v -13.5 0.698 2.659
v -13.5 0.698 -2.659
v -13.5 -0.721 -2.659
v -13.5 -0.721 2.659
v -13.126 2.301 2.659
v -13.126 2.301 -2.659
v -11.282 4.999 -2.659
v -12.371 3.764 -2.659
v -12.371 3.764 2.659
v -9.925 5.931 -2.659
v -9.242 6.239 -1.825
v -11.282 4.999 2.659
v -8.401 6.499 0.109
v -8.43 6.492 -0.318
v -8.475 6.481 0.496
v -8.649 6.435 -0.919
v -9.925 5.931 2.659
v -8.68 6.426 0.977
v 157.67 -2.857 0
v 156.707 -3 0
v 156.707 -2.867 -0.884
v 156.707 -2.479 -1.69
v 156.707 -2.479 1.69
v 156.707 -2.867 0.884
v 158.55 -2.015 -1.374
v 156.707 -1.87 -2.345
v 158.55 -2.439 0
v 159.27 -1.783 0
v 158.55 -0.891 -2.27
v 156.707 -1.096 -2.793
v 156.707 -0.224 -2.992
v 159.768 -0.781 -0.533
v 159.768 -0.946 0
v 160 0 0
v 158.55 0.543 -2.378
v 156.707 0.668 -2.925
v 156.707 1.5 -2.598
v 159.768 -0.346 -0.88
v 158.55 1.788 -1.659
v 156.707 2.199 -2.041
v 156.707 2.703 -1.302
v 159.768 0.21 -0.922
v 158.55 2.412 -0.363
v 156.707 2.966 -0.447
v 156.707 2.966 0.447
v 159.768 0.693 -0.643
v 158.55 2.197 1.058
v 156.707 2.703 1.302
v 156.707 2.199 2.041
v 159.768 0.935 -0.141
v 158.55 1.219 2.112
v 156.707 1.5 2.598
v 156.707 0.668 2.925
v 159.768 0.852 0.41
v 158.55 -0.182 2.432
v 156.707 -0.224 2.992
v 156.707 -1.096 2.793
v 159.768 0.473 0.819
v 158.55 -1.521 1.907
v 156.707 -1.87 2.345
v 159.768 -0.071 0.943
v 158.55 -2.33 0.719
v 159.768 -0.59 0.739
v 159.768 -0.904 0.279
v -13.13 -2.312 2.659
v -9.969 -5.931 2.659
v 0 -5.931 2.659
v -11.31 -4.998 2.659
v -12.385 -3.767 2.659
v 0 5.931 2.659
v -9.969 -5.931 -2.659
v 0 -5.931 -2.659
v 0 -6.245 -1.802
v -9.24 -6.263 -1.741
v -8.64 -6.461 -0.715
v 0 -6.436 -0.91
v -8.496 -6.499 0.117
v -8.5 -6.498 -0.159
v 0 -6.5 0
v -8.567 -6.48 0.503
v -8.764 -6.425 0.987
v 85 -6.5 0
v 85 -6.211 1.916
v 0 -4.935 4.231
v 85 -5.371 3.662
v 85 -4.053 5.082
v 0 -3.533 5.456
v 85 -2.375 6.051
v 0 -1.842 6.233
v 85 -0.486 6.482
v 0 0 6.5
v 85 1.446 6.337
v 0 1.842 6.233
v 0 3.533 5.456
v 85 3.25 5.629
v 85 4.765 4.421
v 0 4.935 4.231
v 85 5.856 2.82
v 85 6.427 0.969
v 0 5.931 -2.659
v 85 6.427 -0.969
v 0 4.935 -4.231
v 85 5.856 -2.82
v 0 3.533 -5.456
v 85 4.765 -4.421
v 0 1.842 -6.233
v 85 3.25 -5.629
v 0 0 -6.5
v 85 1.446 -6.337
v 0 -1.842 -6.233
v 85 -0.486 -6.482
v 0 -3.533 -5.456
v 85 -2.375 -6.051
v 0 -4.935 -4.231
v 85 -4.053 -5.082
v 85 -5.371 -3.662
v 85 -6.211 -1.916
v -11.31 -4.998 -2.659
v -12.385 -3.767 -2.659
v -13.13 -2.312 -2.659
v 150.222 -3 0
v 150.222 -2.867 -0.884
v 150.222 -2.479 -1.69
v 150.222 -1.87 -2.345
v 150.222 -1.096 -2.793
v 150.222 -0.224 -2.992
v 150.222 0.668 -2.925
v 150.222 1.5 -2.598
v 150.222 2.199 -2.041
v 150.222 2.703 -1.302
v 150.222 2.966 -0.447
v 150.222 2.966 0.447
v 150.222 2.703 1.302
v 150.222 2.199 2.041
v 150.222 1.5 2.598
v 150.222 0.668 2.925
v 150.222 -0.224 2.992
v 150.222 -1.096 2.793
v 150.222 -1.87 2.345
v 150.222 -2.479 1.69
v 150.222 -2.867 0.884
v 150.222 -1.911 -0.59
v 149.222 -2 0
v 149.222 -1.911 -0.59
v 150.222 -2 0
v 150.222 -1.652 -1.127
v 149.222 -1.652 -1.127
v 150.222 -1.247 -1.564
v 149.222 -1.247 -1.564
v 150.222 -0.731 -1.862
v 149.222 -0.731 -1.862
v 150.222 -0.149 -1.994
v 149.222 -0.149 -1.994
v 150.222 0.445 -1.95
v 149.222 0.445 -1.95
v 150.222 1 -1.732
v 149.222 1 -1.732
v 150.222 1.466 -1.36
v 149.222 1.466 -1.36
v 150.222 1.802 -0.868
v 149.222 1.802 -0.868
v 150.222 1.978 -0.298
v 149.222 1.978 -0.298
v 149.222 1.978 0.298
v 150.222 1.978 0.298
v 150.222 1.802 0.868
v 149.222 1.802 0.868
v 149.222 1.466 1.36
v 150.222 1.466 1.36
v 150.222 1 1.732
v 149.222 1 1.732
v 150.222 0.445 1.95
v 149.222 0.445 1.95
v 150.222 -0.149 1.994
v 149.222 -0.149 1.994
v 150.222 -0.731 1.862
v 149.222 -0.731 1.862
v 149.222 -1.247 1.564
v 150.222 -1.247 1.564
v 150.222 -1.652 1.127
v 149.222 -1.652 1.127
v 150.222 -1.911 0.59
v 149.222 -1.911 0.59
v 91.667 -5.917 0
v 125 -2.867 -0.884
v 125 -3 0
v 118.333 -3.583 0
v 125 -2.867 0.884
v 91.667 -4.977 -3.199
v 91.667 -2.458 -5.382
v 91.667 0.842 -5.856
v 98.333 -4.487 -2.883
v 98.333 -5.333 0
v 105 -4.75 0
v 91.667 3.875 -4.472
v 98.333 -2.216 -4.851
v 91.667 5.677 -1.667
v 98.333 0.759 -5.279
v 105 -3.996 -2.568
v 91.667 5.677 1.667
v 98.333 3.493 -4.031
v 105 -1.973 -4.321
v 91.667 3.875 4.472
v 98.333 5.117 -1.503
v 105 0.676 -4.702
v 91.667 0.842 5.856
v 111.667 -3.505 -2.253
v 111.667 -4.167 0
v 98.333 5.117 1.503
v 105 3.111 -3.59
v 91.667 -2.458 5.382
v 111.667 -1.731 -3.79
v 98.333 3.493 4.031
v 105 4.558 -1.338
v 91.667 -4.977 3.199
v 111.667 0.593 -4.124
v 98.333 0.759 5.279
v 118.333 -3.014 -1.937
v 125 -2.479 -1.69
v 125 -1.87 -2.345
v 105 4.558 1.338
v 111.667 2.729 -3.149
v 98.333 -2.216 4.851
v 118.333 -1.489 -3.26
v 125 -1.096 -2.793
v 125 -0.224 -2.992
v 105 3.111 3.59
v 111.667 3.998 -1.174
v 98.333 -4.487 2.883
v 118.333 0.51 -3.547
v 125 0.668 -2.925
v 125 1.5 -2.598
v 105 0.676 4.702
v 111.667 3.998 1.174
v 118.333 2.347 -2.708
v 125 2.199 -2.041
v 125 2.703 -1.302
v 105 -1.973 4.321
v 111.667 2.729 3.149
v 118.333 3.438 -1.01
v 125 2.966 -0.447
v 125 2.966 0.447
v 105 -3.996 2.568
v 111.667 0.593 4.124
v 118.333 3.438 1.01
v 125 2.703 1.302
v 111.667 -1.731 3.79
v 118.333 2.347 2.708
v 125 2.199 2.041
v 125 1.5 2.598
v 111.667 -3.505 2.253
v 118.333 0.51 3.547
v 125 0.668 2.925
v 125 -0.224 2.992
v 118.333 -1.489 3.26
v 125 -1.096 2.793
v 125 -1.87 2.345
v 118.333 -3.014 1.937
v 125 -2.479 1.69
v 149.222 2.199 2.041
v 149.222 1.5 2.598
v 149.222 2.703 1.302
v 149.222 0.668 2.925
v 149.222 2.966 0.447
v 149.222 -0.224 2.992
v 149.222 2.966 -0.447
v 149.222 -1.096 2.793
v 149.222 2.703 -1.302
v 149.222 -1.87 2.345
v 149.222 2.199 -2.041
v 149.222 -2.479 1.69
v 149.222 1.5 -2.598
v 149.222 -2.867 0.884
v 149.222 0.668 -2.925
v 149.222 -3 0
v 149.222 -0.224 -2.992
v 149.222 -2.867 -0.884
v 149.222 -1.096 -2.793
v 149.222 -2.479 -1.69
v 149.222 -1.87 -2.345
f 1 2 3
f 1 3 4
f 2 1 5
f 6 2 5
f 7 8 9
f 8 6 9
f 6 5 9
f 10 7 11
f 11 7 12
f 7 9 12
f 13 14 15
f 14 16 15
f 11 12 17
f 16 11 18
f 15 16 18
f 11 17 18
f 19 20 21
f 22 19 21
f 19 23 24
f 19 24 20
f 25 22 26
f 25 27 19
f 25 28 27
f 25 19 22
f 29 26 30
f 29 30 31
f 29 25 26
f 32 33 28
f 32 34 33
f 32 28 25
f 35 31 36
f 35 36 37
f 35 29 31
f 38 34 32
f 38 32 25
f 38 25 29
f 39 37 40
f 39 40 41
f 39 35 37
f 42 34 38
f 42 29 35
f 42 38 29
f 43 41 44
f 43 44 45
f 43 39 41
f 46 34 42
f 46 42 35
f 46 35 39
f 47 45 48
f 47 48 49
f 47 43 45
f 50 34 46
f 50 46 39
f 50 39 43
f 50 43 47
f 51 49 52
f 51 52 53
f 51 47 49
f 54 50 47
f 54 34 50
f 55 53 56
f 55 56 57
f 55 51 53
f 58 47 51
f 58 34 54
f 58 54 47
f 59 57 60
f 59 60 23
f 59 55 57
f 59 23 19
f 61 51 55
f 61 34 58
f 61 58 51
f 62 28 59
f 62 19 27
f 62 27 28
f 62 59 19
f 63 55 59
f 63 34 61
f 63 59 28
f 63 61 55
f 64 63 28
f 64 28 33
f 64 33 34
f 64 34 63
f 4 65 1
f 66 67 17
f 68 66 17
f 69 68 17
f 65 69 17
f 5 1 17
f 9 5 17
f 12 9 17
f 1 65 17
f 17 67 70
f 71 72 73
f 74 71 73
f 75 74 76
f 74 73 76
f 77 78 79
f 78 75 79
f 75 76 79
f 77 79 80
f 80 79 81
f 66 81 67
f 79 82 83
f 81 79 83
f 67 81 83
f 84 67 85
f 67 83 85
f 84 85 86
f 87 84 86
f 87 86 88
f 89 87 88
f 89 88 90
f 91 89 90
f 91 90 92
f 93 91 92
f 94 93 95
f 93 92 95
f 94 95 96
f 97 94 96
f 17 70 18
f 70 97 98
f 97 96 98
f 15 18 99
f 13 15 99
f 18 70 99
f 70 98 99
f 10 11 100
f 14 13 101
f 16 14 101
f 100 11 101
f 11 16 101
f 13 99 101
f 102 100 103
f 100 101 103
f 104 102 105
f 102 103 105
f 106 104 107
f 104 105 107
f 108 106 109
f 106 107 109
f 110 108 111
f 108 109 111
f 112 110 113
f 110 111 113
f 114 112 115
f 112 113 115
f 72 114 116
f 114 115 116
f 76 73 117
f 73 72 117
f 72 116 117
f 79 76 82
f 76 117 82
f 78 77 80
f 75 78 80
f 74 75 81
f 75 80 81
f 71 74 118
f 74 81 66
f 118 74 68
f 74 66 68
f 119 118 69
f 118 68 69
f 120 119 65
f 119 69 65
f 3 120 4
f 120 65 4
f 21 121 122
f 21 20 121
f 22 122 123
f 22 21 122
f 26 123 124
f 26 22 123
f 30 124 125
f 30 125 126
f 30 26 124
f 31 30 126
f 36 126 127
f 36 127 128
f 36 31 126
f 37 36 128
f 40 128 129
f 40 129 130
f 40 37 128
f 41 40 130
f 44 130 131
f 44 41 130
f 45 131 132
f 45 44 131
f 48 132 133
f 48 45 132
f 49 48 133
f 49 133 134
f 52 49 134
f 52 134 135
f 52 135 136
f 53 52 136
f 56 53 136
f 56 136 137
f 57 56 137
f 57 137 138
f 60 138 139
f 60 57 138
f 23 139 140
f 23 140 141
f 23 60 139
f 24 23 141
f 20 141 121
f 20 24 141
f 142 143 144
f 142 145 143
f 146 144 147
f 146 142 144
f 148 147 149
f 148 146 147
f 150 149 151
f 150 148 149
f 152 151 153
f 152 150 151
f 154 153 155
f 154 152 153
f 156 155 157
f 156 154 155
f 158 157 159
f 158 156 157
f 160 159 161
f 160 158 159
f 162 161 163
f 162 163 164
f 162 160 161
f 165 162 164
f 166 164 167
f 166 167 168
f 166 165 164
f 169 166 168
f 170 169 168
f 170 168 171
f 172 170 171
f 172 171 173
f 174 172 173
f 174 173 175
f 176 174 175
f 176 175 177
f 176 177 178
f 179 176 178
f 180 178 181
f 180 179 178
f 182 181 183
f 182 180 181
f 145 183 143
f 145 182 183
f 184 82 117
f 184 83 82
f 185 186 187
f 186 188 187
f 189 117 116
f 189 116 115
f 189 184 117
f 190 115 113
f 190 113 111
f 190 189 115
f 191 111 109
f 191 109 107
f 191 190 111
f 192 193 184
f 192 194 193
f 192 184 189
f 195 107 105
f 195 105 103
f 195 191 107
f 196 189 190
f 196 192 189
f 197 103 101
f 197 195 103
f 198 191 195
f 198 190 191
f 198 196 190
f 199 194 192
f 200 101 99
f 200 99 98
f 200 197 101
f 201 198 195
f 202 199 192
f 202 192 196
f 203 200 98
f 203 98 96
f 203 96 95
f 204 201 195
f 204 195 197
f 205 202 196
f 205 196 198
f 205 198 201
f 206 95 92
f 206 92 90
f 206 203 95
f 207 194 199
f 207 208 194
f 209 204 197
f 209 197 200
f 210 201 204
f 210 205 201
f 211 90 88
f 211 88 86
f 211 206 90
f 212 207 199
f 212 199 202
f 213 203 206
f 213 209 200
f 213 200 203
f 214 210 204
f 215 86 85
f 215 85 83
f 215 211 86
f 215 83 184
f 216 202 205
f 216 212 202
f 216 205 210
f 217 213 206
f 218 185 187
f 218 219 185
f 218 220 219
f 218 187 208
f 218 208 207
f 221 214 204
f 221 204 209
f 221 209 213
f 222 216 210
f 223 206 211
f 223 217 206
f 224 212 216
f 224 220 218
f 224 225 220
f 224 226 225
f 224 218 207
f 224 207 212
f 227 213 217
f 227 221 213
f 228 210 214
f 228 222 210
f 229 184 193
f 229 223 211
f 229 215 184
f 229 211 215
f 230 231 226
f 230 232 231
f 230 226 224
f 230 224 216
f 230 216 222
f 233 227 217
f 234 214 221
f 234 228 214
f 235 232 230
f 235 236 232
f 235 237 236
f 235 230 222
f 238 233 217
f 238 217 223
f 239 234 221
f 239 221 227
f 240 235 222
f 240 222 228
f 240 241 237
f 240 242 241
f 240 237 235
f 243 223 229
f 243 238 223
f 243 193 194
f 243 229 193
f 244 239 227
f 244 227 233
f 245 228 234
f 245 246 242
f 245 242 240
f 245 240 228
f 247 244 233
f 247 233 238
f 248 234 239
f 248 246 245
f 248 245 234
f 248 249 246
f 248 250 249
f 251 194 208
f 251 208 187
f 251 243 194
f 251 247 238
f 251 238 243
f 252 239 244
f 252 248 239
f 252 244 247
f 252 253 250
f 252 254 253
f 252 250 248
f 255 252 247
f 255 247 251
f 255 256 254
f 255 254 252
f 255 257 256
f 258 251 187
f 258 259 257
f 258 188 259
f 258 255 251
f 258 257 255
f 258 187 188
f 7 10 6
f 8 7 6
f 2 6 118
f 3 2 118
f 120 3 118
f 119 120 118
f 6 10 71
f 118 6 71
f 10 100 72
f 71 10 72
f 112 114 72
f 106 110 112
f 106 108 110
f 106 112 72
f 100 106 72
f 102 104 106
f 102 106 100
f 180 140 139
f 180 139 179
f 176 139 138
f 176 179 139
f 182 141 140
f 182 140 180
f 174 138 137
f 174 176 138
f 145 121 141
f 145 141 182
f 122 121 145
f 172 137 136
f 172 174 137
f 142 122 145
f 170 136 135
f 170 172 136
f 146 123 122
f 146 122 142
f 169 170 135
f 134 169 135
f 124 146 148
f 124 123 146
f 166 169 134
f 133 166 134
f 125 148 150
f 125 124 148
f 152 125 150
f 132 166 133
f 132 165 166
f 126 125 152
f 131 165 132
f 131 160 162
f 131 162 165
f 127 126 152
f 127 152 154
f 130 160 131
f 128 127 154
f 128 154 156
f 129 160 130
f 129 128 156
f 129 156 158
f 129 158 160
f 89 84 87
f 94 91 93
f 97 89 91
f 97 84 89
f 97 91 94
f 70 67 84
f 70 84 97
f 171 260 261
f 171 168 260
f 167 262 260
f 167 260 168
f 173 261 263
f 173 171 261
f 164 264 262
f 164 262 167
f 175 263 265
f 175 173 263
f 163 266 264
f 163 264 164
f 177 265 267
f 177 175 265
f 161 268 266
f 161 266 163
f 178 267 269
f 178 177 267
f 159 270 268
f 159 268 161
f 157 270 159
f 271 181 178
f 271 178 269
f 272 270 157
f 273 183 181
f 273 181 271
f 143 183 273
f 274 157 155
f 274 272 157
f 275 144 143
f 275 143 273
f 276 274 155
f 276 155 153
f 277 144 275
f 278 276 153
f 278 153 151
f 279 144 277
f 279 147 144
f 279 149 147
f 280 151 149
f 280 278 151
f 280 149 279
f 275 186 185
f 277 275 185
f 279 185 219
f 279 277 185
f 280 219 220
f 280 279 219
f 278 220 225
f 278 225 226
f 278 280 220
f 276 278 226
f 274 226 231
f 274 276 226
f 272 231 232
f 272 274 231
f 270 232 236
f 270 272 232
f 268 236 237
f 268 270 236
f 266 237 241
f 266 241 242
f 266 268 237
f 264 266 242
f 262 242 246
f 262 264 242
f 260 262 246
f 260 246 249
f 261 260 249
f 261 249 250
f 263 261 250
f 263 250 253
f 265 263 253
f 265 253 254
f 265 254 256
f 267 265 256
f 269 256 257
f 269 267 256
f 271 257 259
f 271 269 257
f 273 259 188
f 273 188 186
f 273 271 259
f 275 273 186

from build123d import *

# Parameters (mm, degrees)
BOSS_EXTRUDE1_DEPTH = 13.5
CUT_EXTRUDE1_DEPTH  = 13.5


with BuildPart() as part:
    # Sketch1 → Revolve1 (revolve)
    with BuildSketch(Plane.XY):
        with BuildLine():
            Line((0, 0), (0, -6.5))
            Line((0, -6.5), (85, -6.5))
            Line((85, -6.5), (125, -3))
            Line((125, -3), (149.222035298, -3))
            Line((149.222035298, -3), (149.222035298, -2))
            Line((149.222035298, -2), (150.222035298, -2))
            Line((150.222035298, -2), (150.222035298, -3))
            Line((150.222035298, -3), (156.707023179, -3))
            ThreePointArc((156.707023179, -3), (158.934336378, -2.137547522), (160, 0))
            Line((160, 0), (0, 0))
        make_face()
    revolve(axis=Axis((0, 0, 0), (1, 0, 0)))

    # Sketch2 → Boss-Extrude1 (add)
    with BuildSketch(Plane.ZY):
        with BuildLine():
            Line((-2.658777536, 5.931349089), (-2.658777536, -5.931349089))
            ThreePointArc((-2.658777536, -5.931349089), (0, -6.5), (2.658777536, -5.931349089))
            Line((2.658777536, -5.931349089), (2.658777536, 5.931349089))
            ThreePointArc((2.658777536, 5.931349089), (0, 6.5), (-2.658777536, 5.931349089))
        make_face()
    extrude(amount=BOSS_EXTRUDE1_DEPTH)

    # Sketch3 → Cut-Extrude1 (cut)
    with BuildSketch(Plane.XY.offset(2.658777536)):
        with BuildLine():
            Line((-7.271115967, 6.669291611), (-14.242543504, 7.619628139))
            Line((-14.242543504, 7.619628139), (-14.81279281, -7.656627724))
            Line((-14.81279281, -7.656627724), (-6.247435847, -8.529121085))
            Line((-6.247435847, -8.529121085), (-7.632896548, -6.659471856))
            ThreePointArc((-7.632896548, -6.659471856), (-13.535199526, 0.170025059), (-7.271115967, 6.669291611))
        make_face()
    extrude(amount=-CUT_EXTRUDE1_DEPTH, mode=Mode.SUBTRACT)


solid = part.part
